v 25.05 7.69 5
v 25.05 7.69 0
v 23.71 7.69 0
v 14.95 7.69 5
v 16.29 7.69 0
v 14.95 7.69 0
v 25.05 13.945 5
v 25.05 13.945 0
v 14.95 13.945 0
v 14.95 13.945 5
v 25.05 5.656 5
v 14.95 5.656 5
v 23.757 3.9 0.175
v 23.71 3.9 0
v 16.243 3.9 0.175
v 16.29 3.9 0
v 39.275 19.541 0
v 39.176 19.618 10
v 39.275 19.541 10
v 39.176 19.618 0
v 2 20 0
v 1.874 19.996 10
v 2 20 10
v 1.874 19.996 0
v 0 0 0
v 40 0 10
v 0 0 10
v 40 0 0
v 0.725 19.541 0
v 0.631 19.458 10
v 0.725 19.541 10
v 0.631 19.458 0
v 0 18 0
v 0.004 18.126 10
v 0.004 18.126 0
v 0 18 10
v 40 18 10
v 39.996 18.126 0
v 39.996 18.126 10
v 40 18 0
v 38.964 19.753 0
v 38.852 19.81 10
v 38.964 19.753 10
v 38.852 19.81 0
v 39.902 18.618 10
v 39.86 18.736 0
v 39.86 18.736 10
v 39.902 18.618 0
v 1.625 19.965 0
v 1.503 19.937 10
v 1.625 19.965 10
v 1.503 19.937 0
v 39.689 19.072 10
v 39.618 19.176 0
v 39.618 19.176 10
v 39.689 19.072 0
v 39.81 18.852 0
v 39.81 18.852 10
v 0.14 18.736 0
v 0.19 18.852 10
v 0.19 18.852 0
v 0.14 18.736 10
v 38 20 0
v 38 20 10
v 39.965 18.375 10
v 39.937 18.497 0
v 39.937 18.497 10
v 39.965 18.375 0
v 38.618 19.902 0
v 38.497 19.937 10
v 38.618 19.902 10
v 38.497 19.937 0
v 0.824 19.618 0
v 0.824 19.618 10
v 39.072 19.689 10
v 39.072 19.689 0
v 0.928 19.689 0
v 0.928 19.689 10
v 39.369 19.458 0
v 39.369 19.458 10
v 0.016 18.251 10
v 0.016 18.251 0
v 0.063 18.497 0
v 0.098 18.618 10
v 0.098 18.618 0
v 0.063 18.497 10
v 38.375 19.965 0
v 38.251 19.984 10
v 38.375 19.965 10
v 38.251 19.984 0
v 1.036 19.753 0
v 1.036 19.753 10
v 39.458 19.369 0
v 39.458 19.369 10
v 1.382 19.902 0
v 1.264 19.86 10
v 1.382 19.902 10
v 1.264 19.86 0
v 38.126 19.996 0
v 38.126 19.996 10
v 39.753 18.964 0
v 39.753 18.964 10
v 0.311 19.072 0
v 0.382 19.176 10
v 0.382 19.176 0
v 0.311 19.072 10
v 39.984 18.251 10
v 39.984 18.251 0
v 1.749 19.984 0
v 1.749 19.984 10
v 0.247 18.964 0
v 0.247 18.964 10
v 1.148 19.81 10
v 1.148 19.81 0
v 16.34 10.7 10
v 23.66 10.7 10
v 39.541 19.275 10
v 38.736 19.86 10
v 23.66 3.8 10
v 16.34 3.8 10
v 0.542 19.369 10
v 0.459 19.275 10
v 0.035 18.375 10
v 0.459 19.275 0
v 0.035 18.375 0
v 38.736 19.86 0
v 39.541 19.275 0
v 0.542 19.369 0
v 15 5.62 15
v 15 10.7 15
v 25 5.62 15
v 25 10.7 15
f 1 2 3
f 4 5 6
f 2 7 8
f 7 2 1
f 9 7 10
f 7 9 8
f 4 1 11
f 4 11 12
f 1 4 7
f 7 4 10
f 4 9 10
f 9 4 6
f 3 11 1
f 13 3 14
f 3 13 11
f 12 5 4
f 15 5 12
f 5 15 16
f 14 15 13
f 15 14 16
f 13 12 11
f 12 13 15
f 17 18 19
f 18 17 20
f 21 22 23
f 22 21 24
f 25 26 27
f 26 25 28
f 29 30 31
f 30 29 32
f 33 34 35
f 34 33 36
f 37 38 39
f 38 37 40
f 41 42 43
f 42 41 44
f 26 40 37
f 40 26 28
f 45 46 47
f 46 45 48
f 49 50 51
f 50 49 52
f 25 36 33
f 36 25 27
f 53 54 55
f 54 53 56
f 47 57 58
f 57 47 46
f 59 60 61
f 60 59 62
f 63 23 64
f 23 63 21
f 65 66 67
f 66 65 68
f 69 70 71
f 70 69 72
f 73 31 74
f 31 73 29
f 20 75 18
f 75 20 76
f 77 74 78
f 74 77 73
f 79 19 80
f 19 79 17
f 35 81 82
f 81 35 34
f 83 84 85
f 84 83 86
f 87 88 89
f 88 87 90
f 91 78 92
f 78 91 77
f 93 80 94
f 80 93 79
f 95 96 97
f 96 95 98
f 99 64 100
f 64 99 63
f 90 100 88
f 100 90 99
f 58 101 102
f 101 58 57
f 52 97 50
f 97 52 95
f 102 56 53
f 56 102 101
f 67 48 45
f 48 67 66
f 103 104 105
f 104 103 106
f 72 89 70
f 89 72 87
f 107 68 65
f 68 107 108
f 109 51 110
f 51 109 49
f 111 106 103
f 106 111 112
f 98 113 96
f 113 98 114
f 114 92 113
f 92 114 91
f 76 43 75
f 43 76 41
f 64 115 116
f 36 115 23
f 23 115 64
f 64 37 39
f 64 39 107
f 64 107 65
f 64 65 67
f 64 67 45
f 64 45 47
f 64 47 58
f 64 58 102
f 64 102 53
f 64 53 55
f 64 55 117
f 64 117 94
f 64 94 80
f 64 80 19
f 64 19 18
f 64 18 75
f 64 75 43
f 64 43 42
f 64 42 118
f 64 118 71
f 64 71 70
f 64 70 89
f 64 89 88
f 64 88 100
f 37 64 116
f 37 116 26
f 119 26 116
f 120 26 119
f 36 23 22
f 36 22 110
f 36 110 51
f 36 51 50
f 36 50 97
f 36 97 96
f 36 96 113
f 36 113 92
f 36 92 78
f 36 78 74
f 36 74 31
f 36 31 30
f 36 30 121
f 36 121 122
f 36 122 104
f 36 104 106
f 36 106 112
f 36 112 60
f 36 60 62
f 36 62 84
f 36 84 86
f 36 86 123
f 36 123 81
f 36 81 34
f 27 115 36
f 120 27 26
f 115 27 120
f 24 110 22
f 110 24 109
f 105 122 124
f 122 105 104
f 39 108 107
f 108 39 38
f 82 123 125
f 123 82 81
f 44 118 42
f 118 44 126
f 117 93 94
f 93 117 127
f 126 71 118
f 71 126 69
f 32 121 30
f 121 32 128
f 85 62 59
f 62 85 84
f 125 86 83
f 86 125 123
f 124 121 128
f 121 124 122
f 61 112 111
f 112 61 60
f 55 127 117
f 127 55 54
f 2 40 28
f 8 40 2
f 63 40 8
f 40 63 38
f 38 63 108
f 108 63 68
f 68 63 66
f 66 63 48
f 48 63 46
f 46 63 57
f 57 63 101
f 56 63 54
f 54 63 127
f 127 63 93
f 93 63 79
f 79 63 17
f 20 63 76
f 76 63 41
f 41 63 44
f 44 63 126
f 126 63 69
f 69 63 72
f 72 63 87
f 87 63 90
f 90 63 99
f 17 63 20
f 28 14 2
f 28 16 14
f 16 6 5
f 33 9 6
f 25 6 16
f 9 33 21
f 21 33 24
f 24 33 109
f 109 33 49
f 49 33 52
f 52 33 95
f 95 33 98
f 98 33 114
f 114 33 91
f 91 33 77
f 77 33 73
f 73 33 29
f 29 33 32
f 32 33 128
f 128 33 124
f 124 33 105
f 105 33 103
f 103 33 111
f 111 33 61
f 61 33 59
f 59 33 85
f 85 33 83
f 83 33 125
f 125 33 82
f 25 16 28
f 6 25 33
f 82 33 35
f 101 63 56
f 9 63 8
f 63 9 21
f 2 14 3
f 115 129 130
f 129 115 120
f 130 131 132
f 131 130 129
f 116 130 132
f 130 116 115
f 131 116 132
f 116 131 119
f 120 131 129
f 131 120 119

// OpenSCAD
// file: TinyDoveTail.scad
module CreateTinyDoveTailRAW(
    thickness=0, clearance=0,
    dove_tan=0.268, // tan (15deg) 
    slope_tan=0.364 // tan (20deg)
    )
{
    // based on the T30 top width at around 20mm, 15deg dovetail
    c = clearance;
    
    dove_half_long=5-c;
    dove_depth=5-2*c;
    dove_half_short=dove_half_long - dove_tan*dove_depth;    
    
    dove_profile=[[-dove_half_long,0],[dove_half_long,0],
        [dove_half_short,dove_depth],[-dove_half_short, dove_depth]];
     
    difference(){
        // dovetail body
        translate([0,0,-2*c])
            linear_extrude(thickness-c)
                polygon(dove_profile);
    
        // cut a slope so model can print without support, 20deg
        slope_recess=dove_depth*slope_tan;
    
        slope_profile=[[0,0],[dove_depth,0], [0,slope_recess]];

        translate([-dove_half_long,0,0])
            rotate([90,0,90])
                linear_extrude(dove_half_long*2)
                    polygon(slope_profile);
    } // end difference
}

// Public
module CreateTinyDoveTail(positive=true, thickness=0)
{
    // negative dovetail is larger
    clearance=positive ? 0 : -0.05;

    // Call the RAW version with default tangent will do
    CreateTinyDoveTailRAW(thickness, clearance);
}

module CreateTinyDoveTailSpacingCube(
    positive=true,thickness){
    // Create a cube space that emcompasses a tinydove.
    // Done by calling the RAW dovetail with 0 tangent (no slope)

    clearance=positive ? 0 : -0.05;
    CreateTinyDoveTailRAW(thickness, clearance, 0, 0);
}

// CreateTinyDoveTail(false, 10);
// main file
use <TinyDoveTail.scad>

width=40;
height=20;
depth=10;
round_corner=2;

extra_clearance=0;
tight_clearance=0.2 + extra_clearance;
t30_bottom_thickness = 4;
t30_top_thickness = 5;
extra_thickness = 1.9;
bottom_thickness = t30_bottom_thickness - tight_clearance;
top_thickness = t30_top_thickness+extra_thickness;
total_thickness = bottom_thickness + t30_top_thickness + extra_thickness;

$fn=100;
union() 
{
    difference()
    {
    hull()
    {
        cube([width, 10, depth], center =    false);
        translate([round_corner,height-round_corner,0])
            cylinder(h=depth, r=round_corner, center=false);
        translate([width-round_corner,height-round_corner,0])
            cylinder(h=depth, r=round_corner, center=false);
    }
    
      union() {
        // dove_enlarge=-0.05;
        // translate([width/2,bottom_thickness*2,5+2*dove_enlarge])
        translate([width/2,bottom_thickness*2,5])
        scale([1,0.9,1]) // 0.9 give it a snap effect
        rotate([-90,0,0])
          CreateTinyDoveTailSpacingCube(
              positive=false,
              thickness=top_thickness
            );
        
        // translate([width/2,bottom_thickness,5+2*dove_enlarge])
        translate([width/2,bottom_thickness,5])
        rotate([-90,0,0])
          CreateTinyDoveTail(
            positive=false,
            thickness=top_thickness
            );

      } // union
    } // difference
    
    // if (create_dovetail_back) {
    {
        translate([width/2,bottom_thickness,5+depth])
        rotate([-90,0,0])
            CreateTinyDoveTail(positive=true, thickness=top_thickness); 
    };
}
